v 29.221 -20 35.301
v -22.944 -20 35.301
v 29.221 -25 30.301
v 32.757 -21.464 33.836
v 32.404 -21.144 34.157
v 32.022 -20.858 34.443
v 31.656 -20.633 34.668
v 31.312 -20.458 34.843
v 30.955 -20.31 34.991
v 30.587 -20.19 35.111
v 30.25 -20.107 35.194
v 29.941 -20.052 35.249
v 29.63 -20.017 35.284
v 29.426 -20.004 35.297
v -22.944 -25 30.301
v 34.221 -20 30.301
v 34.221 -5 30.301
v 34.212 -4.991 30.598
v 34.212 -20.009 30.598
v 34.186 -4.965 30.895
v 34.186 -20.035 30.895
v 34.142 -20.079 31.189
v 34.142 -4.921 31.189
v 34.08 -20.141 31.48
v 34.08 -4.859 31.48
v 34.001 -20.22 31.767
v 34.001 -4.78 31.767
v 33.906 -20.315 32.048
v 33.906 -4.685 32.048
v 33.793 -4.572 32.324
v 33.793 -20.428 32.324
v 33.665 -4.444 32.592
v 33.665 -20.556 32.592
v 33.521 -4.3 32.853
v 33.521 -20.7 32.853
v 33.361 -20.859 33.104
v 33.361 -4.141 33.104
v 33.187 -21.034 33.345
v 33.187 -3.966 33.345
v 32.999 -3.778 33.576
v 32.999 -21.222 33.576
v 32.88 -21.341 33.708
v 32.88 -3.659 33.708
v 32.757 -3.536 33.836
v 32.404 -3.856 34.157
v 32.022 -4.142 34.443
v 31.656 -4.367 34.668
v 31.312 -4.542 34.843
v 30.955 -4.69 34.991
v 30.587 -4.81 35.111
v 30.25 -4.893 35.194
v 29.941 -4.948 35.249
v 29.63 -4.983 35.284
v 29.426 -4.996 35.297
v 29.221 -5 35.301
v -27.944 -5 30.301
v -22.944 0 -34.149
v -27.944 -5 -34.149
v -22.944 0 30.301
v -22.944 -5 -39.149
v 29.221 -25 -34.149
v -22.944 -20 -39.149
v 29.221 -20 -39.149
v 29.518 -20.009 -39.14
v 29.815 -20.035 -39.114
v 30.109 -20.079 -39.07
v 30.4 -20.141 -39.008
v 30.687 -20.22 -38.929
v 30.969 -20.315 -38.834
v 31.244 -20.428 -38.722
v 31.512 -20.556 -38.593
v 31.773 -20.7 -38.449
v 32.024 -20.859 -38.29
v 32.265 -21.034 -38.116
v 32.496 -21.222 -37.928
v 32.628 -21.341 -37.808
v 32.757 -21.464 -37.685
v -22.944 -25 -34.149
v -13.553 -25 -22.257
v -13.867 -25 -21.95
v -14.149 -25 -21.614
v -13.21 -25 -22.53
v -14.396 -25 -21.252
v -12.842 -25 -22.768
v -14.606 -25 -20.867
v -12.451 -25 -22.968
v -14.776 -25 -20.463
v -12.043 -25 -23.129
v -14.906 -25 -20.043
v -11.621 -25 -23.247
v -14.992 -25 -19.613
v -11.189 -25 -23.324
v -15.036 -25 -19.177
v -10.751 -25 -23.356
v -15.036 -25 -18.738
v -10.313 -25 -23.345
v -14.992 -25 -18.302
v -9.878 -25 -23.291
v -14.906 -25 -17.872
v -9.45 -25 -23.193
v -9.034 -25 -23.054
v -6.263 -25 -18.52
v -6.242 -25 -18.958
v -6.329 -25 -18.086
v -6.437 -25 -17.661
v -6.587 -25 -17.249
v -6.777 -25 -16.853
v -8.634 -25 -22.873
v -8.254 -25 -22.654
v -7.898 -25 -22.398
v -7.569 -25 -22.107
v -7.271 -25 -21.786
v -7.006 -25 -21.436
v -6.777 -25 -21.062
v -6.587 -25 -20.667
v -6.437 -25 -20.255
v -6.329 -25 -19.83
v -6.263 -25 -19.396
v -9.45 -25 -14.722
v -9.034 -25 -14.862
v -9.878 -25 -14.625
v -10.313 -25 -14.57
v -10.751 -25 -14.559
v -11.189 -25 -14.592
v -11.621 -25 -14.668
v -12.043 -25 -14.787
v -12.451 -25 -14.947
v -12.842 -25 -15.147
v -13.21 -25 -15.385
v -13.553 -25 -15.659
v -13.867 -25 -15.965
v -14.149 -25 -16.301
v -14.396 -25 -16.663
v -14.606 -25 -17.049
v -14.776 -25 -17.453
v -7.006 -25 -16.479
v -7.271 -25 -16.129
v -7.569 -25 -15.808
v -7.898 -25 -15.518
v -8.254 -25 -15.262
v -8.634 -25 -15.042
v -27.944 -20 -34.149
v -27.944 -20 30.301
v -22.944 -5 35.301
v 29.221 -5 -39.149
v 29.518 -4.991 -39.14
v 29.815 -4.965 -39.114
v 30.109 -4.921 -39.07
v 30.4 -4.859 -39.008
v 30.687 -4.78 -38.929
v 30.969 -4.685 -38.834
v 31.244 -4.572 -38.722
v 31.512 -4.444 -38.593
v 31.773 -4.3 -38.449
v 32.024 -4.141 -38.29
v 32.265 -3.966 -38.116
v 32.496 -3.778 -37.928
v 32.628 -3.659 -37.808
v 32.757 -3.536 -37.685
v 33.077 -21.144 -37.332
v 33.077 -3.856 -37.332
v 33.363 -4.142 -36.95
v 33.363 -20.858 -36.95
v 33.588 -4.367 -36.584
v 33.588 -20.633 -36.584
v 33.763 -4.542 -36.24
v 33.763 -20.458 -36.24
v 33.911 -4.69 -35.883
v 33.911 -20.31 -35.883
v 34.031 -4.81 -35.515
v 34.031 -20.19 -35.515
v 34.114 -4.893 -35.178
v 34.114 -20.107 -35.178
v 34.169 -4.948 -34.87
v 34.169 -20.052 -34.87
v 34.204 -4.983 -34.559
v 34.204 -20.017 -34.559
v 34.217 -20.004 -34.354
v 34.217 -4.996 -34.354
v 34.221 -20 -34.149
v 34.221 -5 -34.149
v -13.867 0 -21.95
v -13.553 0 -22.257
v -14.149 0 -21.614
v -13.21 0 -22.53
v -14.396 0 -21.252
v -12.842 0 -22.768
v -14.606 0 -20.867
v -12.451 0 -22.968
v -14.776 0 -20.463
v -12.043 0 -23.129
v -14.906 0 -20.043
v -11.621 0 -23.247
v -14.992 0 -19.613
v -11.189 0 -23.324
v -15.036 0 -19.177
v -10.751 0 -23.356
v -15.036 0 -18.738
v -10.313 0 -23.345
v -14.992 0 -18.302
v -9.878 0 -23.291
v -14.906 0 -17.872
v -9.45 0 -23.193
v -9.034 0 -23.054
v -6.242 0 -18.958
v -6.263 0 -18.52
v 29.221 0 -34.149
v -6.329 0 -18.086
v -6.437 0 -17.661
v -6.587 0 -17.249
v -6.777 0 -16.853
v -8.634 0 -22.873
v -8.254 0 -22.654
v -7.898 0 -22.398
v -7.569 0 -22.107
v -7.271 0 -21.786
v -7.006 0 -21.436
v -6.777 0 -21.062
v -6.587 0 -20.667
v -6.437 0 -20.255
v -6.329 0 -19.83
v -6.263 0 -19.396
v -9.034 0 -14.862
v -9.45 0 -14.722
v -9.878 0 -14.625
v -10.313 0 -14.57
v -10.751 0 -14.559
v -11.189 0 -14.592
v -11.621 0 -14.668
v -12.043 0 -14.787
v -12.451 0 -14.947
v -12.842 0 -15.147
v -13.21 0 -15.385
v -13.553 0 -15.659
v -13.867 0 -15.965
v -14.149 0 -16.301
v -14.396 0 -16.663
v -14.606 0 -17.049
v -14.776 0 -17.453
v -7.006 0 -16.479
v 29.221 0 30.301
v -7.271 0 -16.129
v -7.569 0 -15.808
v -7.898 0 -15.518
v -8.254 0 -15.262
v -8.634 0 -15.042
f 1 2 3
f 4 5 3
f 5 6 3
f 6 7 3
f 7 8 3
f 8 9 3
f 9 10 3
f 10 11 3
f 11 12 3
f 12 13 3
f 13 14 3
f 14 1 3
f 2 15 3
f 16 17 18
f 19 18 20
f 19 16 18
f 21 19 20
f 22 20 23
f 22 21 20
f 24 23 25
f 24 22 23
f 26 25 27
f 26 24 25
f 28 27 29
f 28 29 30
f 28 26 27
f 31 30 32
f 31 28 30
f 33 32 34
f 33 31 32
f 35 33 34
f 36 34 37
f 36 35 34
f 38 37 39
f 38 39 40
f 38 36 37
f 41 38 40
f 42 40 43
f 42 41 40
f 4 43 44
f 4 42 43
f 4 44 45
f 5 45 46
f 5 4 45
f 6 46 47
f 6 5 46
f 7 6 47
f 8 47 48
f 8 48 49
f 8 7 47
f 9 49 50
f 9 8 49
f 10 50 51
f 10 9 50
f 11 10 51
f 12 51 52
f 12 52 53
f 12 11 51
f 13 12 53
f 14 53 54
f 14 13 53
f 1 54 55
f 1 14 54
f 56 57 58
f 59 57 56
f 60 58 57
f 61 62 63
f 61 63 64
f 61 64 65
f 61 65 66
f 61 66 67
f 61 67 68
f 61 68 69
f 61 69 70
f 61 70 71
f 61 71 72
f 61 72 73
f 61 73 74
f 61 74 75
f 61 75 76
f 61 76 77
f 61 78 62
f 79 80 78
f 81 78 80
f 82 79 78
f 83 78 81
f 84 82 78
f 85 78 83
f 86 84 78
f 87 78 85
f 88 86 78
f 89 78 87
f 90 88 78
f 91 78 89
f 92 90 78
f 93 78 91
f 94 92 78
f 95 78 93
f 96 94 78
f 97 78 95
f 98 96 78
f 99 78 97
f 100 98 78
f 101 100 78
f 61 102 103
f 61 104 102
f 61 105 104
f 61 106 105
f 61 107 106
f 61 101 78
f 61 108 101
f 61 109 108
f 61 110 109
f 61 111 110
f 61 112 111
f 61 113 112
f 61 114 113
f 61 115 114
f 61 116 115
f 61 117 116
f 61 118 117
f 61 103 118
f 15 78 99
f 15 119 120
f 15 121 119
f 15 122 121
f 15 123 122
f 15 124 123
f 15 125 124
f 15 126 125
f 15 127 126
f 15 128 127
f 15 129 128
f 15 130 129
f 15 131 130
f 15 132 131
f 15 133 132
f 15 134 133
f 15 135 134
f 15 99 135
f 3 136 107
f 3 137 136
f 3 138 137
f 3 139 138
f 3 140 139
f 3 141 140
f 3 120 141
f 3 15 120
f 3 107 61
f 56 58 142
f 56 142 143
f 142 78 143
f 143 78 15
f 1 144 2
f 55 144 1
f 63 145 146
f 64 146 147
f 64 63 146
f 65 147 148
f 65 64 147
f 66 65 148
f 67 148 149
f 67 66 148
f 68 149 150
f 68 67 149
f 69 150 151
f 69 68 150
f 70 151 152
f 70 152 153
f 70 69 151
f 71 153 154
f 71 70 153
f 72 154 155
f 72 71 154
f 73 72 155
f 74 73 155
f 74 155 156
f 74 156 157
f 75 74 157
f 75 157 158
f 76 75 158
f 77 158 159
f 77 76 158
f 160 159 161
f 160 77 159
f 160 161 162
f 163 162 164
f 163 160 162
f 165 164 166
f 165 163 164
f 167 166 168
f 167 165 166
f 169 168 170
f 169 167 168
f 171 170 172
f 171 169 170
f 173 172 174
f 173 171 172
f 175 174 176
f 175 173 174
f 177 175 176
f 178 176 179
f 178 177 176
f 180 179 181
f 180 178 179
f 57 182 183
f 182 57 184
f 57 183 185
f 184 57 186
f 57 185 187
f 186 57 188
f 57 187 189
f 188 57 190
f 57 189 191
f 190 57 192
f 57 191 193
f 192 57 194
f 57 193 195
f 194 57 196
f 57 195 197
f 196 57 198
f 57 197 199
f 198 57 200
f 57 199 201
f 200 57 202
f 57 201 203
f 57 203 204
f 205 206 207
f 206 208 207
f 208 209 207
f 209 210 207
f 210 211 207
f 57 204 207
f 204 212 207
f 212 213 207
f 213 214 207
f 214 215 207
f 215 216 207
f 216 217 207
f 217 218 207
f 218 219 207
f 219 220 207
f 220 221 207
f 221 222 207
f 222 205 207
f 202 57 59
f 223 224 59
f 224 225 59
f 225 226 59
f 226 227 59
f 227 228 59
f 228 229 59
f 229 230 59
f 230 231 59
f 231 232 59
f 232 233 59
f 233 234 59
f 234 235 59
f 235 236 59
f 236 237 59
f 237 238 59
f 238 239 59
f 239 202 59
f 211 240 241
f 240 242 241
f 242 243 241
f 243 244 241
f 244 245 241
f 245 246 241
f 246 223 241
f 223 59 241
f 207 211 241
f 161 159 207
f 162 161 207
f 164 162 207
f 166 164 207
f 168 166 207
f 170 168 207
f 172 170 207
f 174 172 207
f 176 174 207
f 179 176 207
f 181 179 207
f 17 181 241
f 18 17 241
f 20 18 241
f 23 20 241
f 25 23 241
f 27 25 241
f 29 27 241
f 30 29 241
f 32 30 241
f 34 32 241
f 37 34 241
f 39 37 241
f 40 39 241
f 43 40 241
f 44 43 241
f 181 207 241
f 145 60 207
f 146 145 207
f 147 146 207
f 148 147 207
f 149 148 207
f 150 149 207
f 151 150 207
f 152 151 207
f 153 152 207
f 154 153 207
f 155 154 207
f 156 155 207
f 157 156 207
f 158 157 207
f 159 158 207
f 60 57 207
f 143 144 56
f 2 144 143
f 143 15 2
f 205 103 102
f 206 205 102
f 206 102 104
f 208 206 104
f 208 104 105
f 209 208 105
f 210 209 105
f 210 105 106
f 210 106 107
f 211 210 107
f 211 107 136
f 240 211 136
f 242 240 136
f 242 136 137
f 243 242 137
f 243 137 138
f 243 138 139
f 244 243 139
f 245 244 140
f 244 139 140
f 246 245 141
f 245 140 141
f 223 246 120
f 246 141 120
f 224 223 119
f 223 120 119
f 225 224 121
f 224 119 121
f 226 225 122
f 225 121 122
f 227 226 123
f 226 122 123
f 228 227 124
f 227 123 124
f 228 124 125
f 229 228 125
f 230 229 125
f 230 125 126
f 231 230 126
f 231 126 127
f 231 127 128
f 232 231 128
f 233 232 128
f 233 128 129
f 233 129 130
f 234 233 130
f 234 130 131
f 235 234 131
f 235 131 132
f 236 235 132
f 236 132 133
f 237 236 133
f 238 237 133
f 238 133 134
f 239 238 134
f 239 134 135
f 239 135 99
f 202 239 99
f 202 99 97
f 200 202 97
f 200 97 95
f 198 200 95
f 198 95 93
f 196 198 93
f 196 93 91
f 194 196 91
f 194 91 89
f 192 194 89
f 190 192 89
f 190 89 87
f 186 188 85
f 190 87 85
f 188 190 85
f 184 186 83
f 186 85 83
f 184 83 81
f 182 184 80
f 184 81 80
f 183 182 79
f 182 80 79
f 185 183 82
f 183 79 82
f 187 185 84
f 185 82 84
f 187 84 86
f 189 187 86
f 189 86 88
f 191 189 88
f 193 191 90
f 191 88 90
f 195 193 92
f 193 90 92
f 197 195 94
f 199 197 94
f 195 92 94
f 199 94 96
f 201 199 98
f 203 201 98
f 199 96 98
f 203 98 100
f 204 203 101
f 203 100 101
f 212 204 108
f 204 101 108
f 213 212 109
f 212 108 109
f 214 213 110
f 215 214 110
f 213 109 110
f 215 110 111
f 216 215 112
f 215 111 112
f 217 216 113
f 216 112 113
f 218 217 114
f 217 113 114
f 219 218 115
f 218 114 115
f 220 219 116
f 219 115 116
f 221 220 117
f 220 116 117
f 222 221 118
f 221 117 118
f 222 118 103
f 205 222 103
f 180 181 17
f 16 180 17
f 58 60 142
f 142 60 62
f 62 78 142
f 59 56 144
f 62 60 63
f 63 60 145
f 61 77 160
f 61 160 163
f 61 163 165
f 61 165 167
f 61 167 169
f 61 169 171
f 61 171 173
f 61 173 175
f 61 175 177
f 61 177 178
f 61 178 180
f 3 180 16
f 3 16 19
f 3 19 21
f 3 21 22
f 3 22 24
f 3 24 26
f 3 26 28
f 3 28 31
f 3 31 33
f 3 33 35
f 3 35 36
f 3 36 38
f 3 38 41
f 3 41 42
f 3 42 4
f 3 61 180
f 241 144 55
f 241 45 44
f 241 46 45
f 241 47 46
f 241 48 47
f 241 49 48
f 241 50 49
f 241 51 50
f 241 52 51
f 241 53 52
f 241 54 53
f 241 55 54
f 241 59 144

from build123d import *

# Parameters (mm, degrees)
F0_W     = 62.165049836
F0_H     = 74.4500532746
F1_DEPTH = 25
F2_SIZE  = 5
F4_D     = 8.8
F5_R     = 5
F6_R     = 5


with BuildPart() as f1:
    # F0 (on Front) → F1 (new body)
    with BuildSketch(Plane.XZ):
        with Locations((3.1384425238, -1.9241571426)):
            Rectangle(F0_W, F0_H)
    extrude(amount=F1_DEPTH)

    # F2
    f2_edges = [f1.edges().sort_by_distance(p)[0] for p in [
        (-27.944082, 0, -1.924157),
        (3.138443, -25, 35.300869),
        (-27.944082, -25, -1.924157),
        (3.138443, -25, -39.149184),
        (34.220967, -25, -1.924157),
        (-27.944082, -12.5, 35.300869),
        (-27.944082, -12.5, -39.149184),
        (3.138443, 0, -39.149184),
        (34.220967, 0, -1.924157),
        (3.138443, 0, 35.300869),
    ]]
    chamfer(f2_edges, length=F2_SIZE)

    # F4 (through all)
    with Locations(Plane(origin=(0, 0, 0), x_dir=(-1, 0, 0), z_dir=(0, 1, 0))):
        with Locations((10.6416083872, -18.9576819539)):
            Hole(F4_D / 2)

    # F5
    f5_edges = [f1.edges().sort_by_distance(p)[0] for p in [
        (34.220967, -12.5, -39.149184),
    ]]
    fillet(f5_edges, radius=F5_R)

    # F6
    f6_edges = [f1.edges().sort_by_distance(p)[0] for p in [
        (34.220967, -12.5, 35.300869),
    ]]
    fillet(f6_edges, radius=F6_R)


solid = f1.part
